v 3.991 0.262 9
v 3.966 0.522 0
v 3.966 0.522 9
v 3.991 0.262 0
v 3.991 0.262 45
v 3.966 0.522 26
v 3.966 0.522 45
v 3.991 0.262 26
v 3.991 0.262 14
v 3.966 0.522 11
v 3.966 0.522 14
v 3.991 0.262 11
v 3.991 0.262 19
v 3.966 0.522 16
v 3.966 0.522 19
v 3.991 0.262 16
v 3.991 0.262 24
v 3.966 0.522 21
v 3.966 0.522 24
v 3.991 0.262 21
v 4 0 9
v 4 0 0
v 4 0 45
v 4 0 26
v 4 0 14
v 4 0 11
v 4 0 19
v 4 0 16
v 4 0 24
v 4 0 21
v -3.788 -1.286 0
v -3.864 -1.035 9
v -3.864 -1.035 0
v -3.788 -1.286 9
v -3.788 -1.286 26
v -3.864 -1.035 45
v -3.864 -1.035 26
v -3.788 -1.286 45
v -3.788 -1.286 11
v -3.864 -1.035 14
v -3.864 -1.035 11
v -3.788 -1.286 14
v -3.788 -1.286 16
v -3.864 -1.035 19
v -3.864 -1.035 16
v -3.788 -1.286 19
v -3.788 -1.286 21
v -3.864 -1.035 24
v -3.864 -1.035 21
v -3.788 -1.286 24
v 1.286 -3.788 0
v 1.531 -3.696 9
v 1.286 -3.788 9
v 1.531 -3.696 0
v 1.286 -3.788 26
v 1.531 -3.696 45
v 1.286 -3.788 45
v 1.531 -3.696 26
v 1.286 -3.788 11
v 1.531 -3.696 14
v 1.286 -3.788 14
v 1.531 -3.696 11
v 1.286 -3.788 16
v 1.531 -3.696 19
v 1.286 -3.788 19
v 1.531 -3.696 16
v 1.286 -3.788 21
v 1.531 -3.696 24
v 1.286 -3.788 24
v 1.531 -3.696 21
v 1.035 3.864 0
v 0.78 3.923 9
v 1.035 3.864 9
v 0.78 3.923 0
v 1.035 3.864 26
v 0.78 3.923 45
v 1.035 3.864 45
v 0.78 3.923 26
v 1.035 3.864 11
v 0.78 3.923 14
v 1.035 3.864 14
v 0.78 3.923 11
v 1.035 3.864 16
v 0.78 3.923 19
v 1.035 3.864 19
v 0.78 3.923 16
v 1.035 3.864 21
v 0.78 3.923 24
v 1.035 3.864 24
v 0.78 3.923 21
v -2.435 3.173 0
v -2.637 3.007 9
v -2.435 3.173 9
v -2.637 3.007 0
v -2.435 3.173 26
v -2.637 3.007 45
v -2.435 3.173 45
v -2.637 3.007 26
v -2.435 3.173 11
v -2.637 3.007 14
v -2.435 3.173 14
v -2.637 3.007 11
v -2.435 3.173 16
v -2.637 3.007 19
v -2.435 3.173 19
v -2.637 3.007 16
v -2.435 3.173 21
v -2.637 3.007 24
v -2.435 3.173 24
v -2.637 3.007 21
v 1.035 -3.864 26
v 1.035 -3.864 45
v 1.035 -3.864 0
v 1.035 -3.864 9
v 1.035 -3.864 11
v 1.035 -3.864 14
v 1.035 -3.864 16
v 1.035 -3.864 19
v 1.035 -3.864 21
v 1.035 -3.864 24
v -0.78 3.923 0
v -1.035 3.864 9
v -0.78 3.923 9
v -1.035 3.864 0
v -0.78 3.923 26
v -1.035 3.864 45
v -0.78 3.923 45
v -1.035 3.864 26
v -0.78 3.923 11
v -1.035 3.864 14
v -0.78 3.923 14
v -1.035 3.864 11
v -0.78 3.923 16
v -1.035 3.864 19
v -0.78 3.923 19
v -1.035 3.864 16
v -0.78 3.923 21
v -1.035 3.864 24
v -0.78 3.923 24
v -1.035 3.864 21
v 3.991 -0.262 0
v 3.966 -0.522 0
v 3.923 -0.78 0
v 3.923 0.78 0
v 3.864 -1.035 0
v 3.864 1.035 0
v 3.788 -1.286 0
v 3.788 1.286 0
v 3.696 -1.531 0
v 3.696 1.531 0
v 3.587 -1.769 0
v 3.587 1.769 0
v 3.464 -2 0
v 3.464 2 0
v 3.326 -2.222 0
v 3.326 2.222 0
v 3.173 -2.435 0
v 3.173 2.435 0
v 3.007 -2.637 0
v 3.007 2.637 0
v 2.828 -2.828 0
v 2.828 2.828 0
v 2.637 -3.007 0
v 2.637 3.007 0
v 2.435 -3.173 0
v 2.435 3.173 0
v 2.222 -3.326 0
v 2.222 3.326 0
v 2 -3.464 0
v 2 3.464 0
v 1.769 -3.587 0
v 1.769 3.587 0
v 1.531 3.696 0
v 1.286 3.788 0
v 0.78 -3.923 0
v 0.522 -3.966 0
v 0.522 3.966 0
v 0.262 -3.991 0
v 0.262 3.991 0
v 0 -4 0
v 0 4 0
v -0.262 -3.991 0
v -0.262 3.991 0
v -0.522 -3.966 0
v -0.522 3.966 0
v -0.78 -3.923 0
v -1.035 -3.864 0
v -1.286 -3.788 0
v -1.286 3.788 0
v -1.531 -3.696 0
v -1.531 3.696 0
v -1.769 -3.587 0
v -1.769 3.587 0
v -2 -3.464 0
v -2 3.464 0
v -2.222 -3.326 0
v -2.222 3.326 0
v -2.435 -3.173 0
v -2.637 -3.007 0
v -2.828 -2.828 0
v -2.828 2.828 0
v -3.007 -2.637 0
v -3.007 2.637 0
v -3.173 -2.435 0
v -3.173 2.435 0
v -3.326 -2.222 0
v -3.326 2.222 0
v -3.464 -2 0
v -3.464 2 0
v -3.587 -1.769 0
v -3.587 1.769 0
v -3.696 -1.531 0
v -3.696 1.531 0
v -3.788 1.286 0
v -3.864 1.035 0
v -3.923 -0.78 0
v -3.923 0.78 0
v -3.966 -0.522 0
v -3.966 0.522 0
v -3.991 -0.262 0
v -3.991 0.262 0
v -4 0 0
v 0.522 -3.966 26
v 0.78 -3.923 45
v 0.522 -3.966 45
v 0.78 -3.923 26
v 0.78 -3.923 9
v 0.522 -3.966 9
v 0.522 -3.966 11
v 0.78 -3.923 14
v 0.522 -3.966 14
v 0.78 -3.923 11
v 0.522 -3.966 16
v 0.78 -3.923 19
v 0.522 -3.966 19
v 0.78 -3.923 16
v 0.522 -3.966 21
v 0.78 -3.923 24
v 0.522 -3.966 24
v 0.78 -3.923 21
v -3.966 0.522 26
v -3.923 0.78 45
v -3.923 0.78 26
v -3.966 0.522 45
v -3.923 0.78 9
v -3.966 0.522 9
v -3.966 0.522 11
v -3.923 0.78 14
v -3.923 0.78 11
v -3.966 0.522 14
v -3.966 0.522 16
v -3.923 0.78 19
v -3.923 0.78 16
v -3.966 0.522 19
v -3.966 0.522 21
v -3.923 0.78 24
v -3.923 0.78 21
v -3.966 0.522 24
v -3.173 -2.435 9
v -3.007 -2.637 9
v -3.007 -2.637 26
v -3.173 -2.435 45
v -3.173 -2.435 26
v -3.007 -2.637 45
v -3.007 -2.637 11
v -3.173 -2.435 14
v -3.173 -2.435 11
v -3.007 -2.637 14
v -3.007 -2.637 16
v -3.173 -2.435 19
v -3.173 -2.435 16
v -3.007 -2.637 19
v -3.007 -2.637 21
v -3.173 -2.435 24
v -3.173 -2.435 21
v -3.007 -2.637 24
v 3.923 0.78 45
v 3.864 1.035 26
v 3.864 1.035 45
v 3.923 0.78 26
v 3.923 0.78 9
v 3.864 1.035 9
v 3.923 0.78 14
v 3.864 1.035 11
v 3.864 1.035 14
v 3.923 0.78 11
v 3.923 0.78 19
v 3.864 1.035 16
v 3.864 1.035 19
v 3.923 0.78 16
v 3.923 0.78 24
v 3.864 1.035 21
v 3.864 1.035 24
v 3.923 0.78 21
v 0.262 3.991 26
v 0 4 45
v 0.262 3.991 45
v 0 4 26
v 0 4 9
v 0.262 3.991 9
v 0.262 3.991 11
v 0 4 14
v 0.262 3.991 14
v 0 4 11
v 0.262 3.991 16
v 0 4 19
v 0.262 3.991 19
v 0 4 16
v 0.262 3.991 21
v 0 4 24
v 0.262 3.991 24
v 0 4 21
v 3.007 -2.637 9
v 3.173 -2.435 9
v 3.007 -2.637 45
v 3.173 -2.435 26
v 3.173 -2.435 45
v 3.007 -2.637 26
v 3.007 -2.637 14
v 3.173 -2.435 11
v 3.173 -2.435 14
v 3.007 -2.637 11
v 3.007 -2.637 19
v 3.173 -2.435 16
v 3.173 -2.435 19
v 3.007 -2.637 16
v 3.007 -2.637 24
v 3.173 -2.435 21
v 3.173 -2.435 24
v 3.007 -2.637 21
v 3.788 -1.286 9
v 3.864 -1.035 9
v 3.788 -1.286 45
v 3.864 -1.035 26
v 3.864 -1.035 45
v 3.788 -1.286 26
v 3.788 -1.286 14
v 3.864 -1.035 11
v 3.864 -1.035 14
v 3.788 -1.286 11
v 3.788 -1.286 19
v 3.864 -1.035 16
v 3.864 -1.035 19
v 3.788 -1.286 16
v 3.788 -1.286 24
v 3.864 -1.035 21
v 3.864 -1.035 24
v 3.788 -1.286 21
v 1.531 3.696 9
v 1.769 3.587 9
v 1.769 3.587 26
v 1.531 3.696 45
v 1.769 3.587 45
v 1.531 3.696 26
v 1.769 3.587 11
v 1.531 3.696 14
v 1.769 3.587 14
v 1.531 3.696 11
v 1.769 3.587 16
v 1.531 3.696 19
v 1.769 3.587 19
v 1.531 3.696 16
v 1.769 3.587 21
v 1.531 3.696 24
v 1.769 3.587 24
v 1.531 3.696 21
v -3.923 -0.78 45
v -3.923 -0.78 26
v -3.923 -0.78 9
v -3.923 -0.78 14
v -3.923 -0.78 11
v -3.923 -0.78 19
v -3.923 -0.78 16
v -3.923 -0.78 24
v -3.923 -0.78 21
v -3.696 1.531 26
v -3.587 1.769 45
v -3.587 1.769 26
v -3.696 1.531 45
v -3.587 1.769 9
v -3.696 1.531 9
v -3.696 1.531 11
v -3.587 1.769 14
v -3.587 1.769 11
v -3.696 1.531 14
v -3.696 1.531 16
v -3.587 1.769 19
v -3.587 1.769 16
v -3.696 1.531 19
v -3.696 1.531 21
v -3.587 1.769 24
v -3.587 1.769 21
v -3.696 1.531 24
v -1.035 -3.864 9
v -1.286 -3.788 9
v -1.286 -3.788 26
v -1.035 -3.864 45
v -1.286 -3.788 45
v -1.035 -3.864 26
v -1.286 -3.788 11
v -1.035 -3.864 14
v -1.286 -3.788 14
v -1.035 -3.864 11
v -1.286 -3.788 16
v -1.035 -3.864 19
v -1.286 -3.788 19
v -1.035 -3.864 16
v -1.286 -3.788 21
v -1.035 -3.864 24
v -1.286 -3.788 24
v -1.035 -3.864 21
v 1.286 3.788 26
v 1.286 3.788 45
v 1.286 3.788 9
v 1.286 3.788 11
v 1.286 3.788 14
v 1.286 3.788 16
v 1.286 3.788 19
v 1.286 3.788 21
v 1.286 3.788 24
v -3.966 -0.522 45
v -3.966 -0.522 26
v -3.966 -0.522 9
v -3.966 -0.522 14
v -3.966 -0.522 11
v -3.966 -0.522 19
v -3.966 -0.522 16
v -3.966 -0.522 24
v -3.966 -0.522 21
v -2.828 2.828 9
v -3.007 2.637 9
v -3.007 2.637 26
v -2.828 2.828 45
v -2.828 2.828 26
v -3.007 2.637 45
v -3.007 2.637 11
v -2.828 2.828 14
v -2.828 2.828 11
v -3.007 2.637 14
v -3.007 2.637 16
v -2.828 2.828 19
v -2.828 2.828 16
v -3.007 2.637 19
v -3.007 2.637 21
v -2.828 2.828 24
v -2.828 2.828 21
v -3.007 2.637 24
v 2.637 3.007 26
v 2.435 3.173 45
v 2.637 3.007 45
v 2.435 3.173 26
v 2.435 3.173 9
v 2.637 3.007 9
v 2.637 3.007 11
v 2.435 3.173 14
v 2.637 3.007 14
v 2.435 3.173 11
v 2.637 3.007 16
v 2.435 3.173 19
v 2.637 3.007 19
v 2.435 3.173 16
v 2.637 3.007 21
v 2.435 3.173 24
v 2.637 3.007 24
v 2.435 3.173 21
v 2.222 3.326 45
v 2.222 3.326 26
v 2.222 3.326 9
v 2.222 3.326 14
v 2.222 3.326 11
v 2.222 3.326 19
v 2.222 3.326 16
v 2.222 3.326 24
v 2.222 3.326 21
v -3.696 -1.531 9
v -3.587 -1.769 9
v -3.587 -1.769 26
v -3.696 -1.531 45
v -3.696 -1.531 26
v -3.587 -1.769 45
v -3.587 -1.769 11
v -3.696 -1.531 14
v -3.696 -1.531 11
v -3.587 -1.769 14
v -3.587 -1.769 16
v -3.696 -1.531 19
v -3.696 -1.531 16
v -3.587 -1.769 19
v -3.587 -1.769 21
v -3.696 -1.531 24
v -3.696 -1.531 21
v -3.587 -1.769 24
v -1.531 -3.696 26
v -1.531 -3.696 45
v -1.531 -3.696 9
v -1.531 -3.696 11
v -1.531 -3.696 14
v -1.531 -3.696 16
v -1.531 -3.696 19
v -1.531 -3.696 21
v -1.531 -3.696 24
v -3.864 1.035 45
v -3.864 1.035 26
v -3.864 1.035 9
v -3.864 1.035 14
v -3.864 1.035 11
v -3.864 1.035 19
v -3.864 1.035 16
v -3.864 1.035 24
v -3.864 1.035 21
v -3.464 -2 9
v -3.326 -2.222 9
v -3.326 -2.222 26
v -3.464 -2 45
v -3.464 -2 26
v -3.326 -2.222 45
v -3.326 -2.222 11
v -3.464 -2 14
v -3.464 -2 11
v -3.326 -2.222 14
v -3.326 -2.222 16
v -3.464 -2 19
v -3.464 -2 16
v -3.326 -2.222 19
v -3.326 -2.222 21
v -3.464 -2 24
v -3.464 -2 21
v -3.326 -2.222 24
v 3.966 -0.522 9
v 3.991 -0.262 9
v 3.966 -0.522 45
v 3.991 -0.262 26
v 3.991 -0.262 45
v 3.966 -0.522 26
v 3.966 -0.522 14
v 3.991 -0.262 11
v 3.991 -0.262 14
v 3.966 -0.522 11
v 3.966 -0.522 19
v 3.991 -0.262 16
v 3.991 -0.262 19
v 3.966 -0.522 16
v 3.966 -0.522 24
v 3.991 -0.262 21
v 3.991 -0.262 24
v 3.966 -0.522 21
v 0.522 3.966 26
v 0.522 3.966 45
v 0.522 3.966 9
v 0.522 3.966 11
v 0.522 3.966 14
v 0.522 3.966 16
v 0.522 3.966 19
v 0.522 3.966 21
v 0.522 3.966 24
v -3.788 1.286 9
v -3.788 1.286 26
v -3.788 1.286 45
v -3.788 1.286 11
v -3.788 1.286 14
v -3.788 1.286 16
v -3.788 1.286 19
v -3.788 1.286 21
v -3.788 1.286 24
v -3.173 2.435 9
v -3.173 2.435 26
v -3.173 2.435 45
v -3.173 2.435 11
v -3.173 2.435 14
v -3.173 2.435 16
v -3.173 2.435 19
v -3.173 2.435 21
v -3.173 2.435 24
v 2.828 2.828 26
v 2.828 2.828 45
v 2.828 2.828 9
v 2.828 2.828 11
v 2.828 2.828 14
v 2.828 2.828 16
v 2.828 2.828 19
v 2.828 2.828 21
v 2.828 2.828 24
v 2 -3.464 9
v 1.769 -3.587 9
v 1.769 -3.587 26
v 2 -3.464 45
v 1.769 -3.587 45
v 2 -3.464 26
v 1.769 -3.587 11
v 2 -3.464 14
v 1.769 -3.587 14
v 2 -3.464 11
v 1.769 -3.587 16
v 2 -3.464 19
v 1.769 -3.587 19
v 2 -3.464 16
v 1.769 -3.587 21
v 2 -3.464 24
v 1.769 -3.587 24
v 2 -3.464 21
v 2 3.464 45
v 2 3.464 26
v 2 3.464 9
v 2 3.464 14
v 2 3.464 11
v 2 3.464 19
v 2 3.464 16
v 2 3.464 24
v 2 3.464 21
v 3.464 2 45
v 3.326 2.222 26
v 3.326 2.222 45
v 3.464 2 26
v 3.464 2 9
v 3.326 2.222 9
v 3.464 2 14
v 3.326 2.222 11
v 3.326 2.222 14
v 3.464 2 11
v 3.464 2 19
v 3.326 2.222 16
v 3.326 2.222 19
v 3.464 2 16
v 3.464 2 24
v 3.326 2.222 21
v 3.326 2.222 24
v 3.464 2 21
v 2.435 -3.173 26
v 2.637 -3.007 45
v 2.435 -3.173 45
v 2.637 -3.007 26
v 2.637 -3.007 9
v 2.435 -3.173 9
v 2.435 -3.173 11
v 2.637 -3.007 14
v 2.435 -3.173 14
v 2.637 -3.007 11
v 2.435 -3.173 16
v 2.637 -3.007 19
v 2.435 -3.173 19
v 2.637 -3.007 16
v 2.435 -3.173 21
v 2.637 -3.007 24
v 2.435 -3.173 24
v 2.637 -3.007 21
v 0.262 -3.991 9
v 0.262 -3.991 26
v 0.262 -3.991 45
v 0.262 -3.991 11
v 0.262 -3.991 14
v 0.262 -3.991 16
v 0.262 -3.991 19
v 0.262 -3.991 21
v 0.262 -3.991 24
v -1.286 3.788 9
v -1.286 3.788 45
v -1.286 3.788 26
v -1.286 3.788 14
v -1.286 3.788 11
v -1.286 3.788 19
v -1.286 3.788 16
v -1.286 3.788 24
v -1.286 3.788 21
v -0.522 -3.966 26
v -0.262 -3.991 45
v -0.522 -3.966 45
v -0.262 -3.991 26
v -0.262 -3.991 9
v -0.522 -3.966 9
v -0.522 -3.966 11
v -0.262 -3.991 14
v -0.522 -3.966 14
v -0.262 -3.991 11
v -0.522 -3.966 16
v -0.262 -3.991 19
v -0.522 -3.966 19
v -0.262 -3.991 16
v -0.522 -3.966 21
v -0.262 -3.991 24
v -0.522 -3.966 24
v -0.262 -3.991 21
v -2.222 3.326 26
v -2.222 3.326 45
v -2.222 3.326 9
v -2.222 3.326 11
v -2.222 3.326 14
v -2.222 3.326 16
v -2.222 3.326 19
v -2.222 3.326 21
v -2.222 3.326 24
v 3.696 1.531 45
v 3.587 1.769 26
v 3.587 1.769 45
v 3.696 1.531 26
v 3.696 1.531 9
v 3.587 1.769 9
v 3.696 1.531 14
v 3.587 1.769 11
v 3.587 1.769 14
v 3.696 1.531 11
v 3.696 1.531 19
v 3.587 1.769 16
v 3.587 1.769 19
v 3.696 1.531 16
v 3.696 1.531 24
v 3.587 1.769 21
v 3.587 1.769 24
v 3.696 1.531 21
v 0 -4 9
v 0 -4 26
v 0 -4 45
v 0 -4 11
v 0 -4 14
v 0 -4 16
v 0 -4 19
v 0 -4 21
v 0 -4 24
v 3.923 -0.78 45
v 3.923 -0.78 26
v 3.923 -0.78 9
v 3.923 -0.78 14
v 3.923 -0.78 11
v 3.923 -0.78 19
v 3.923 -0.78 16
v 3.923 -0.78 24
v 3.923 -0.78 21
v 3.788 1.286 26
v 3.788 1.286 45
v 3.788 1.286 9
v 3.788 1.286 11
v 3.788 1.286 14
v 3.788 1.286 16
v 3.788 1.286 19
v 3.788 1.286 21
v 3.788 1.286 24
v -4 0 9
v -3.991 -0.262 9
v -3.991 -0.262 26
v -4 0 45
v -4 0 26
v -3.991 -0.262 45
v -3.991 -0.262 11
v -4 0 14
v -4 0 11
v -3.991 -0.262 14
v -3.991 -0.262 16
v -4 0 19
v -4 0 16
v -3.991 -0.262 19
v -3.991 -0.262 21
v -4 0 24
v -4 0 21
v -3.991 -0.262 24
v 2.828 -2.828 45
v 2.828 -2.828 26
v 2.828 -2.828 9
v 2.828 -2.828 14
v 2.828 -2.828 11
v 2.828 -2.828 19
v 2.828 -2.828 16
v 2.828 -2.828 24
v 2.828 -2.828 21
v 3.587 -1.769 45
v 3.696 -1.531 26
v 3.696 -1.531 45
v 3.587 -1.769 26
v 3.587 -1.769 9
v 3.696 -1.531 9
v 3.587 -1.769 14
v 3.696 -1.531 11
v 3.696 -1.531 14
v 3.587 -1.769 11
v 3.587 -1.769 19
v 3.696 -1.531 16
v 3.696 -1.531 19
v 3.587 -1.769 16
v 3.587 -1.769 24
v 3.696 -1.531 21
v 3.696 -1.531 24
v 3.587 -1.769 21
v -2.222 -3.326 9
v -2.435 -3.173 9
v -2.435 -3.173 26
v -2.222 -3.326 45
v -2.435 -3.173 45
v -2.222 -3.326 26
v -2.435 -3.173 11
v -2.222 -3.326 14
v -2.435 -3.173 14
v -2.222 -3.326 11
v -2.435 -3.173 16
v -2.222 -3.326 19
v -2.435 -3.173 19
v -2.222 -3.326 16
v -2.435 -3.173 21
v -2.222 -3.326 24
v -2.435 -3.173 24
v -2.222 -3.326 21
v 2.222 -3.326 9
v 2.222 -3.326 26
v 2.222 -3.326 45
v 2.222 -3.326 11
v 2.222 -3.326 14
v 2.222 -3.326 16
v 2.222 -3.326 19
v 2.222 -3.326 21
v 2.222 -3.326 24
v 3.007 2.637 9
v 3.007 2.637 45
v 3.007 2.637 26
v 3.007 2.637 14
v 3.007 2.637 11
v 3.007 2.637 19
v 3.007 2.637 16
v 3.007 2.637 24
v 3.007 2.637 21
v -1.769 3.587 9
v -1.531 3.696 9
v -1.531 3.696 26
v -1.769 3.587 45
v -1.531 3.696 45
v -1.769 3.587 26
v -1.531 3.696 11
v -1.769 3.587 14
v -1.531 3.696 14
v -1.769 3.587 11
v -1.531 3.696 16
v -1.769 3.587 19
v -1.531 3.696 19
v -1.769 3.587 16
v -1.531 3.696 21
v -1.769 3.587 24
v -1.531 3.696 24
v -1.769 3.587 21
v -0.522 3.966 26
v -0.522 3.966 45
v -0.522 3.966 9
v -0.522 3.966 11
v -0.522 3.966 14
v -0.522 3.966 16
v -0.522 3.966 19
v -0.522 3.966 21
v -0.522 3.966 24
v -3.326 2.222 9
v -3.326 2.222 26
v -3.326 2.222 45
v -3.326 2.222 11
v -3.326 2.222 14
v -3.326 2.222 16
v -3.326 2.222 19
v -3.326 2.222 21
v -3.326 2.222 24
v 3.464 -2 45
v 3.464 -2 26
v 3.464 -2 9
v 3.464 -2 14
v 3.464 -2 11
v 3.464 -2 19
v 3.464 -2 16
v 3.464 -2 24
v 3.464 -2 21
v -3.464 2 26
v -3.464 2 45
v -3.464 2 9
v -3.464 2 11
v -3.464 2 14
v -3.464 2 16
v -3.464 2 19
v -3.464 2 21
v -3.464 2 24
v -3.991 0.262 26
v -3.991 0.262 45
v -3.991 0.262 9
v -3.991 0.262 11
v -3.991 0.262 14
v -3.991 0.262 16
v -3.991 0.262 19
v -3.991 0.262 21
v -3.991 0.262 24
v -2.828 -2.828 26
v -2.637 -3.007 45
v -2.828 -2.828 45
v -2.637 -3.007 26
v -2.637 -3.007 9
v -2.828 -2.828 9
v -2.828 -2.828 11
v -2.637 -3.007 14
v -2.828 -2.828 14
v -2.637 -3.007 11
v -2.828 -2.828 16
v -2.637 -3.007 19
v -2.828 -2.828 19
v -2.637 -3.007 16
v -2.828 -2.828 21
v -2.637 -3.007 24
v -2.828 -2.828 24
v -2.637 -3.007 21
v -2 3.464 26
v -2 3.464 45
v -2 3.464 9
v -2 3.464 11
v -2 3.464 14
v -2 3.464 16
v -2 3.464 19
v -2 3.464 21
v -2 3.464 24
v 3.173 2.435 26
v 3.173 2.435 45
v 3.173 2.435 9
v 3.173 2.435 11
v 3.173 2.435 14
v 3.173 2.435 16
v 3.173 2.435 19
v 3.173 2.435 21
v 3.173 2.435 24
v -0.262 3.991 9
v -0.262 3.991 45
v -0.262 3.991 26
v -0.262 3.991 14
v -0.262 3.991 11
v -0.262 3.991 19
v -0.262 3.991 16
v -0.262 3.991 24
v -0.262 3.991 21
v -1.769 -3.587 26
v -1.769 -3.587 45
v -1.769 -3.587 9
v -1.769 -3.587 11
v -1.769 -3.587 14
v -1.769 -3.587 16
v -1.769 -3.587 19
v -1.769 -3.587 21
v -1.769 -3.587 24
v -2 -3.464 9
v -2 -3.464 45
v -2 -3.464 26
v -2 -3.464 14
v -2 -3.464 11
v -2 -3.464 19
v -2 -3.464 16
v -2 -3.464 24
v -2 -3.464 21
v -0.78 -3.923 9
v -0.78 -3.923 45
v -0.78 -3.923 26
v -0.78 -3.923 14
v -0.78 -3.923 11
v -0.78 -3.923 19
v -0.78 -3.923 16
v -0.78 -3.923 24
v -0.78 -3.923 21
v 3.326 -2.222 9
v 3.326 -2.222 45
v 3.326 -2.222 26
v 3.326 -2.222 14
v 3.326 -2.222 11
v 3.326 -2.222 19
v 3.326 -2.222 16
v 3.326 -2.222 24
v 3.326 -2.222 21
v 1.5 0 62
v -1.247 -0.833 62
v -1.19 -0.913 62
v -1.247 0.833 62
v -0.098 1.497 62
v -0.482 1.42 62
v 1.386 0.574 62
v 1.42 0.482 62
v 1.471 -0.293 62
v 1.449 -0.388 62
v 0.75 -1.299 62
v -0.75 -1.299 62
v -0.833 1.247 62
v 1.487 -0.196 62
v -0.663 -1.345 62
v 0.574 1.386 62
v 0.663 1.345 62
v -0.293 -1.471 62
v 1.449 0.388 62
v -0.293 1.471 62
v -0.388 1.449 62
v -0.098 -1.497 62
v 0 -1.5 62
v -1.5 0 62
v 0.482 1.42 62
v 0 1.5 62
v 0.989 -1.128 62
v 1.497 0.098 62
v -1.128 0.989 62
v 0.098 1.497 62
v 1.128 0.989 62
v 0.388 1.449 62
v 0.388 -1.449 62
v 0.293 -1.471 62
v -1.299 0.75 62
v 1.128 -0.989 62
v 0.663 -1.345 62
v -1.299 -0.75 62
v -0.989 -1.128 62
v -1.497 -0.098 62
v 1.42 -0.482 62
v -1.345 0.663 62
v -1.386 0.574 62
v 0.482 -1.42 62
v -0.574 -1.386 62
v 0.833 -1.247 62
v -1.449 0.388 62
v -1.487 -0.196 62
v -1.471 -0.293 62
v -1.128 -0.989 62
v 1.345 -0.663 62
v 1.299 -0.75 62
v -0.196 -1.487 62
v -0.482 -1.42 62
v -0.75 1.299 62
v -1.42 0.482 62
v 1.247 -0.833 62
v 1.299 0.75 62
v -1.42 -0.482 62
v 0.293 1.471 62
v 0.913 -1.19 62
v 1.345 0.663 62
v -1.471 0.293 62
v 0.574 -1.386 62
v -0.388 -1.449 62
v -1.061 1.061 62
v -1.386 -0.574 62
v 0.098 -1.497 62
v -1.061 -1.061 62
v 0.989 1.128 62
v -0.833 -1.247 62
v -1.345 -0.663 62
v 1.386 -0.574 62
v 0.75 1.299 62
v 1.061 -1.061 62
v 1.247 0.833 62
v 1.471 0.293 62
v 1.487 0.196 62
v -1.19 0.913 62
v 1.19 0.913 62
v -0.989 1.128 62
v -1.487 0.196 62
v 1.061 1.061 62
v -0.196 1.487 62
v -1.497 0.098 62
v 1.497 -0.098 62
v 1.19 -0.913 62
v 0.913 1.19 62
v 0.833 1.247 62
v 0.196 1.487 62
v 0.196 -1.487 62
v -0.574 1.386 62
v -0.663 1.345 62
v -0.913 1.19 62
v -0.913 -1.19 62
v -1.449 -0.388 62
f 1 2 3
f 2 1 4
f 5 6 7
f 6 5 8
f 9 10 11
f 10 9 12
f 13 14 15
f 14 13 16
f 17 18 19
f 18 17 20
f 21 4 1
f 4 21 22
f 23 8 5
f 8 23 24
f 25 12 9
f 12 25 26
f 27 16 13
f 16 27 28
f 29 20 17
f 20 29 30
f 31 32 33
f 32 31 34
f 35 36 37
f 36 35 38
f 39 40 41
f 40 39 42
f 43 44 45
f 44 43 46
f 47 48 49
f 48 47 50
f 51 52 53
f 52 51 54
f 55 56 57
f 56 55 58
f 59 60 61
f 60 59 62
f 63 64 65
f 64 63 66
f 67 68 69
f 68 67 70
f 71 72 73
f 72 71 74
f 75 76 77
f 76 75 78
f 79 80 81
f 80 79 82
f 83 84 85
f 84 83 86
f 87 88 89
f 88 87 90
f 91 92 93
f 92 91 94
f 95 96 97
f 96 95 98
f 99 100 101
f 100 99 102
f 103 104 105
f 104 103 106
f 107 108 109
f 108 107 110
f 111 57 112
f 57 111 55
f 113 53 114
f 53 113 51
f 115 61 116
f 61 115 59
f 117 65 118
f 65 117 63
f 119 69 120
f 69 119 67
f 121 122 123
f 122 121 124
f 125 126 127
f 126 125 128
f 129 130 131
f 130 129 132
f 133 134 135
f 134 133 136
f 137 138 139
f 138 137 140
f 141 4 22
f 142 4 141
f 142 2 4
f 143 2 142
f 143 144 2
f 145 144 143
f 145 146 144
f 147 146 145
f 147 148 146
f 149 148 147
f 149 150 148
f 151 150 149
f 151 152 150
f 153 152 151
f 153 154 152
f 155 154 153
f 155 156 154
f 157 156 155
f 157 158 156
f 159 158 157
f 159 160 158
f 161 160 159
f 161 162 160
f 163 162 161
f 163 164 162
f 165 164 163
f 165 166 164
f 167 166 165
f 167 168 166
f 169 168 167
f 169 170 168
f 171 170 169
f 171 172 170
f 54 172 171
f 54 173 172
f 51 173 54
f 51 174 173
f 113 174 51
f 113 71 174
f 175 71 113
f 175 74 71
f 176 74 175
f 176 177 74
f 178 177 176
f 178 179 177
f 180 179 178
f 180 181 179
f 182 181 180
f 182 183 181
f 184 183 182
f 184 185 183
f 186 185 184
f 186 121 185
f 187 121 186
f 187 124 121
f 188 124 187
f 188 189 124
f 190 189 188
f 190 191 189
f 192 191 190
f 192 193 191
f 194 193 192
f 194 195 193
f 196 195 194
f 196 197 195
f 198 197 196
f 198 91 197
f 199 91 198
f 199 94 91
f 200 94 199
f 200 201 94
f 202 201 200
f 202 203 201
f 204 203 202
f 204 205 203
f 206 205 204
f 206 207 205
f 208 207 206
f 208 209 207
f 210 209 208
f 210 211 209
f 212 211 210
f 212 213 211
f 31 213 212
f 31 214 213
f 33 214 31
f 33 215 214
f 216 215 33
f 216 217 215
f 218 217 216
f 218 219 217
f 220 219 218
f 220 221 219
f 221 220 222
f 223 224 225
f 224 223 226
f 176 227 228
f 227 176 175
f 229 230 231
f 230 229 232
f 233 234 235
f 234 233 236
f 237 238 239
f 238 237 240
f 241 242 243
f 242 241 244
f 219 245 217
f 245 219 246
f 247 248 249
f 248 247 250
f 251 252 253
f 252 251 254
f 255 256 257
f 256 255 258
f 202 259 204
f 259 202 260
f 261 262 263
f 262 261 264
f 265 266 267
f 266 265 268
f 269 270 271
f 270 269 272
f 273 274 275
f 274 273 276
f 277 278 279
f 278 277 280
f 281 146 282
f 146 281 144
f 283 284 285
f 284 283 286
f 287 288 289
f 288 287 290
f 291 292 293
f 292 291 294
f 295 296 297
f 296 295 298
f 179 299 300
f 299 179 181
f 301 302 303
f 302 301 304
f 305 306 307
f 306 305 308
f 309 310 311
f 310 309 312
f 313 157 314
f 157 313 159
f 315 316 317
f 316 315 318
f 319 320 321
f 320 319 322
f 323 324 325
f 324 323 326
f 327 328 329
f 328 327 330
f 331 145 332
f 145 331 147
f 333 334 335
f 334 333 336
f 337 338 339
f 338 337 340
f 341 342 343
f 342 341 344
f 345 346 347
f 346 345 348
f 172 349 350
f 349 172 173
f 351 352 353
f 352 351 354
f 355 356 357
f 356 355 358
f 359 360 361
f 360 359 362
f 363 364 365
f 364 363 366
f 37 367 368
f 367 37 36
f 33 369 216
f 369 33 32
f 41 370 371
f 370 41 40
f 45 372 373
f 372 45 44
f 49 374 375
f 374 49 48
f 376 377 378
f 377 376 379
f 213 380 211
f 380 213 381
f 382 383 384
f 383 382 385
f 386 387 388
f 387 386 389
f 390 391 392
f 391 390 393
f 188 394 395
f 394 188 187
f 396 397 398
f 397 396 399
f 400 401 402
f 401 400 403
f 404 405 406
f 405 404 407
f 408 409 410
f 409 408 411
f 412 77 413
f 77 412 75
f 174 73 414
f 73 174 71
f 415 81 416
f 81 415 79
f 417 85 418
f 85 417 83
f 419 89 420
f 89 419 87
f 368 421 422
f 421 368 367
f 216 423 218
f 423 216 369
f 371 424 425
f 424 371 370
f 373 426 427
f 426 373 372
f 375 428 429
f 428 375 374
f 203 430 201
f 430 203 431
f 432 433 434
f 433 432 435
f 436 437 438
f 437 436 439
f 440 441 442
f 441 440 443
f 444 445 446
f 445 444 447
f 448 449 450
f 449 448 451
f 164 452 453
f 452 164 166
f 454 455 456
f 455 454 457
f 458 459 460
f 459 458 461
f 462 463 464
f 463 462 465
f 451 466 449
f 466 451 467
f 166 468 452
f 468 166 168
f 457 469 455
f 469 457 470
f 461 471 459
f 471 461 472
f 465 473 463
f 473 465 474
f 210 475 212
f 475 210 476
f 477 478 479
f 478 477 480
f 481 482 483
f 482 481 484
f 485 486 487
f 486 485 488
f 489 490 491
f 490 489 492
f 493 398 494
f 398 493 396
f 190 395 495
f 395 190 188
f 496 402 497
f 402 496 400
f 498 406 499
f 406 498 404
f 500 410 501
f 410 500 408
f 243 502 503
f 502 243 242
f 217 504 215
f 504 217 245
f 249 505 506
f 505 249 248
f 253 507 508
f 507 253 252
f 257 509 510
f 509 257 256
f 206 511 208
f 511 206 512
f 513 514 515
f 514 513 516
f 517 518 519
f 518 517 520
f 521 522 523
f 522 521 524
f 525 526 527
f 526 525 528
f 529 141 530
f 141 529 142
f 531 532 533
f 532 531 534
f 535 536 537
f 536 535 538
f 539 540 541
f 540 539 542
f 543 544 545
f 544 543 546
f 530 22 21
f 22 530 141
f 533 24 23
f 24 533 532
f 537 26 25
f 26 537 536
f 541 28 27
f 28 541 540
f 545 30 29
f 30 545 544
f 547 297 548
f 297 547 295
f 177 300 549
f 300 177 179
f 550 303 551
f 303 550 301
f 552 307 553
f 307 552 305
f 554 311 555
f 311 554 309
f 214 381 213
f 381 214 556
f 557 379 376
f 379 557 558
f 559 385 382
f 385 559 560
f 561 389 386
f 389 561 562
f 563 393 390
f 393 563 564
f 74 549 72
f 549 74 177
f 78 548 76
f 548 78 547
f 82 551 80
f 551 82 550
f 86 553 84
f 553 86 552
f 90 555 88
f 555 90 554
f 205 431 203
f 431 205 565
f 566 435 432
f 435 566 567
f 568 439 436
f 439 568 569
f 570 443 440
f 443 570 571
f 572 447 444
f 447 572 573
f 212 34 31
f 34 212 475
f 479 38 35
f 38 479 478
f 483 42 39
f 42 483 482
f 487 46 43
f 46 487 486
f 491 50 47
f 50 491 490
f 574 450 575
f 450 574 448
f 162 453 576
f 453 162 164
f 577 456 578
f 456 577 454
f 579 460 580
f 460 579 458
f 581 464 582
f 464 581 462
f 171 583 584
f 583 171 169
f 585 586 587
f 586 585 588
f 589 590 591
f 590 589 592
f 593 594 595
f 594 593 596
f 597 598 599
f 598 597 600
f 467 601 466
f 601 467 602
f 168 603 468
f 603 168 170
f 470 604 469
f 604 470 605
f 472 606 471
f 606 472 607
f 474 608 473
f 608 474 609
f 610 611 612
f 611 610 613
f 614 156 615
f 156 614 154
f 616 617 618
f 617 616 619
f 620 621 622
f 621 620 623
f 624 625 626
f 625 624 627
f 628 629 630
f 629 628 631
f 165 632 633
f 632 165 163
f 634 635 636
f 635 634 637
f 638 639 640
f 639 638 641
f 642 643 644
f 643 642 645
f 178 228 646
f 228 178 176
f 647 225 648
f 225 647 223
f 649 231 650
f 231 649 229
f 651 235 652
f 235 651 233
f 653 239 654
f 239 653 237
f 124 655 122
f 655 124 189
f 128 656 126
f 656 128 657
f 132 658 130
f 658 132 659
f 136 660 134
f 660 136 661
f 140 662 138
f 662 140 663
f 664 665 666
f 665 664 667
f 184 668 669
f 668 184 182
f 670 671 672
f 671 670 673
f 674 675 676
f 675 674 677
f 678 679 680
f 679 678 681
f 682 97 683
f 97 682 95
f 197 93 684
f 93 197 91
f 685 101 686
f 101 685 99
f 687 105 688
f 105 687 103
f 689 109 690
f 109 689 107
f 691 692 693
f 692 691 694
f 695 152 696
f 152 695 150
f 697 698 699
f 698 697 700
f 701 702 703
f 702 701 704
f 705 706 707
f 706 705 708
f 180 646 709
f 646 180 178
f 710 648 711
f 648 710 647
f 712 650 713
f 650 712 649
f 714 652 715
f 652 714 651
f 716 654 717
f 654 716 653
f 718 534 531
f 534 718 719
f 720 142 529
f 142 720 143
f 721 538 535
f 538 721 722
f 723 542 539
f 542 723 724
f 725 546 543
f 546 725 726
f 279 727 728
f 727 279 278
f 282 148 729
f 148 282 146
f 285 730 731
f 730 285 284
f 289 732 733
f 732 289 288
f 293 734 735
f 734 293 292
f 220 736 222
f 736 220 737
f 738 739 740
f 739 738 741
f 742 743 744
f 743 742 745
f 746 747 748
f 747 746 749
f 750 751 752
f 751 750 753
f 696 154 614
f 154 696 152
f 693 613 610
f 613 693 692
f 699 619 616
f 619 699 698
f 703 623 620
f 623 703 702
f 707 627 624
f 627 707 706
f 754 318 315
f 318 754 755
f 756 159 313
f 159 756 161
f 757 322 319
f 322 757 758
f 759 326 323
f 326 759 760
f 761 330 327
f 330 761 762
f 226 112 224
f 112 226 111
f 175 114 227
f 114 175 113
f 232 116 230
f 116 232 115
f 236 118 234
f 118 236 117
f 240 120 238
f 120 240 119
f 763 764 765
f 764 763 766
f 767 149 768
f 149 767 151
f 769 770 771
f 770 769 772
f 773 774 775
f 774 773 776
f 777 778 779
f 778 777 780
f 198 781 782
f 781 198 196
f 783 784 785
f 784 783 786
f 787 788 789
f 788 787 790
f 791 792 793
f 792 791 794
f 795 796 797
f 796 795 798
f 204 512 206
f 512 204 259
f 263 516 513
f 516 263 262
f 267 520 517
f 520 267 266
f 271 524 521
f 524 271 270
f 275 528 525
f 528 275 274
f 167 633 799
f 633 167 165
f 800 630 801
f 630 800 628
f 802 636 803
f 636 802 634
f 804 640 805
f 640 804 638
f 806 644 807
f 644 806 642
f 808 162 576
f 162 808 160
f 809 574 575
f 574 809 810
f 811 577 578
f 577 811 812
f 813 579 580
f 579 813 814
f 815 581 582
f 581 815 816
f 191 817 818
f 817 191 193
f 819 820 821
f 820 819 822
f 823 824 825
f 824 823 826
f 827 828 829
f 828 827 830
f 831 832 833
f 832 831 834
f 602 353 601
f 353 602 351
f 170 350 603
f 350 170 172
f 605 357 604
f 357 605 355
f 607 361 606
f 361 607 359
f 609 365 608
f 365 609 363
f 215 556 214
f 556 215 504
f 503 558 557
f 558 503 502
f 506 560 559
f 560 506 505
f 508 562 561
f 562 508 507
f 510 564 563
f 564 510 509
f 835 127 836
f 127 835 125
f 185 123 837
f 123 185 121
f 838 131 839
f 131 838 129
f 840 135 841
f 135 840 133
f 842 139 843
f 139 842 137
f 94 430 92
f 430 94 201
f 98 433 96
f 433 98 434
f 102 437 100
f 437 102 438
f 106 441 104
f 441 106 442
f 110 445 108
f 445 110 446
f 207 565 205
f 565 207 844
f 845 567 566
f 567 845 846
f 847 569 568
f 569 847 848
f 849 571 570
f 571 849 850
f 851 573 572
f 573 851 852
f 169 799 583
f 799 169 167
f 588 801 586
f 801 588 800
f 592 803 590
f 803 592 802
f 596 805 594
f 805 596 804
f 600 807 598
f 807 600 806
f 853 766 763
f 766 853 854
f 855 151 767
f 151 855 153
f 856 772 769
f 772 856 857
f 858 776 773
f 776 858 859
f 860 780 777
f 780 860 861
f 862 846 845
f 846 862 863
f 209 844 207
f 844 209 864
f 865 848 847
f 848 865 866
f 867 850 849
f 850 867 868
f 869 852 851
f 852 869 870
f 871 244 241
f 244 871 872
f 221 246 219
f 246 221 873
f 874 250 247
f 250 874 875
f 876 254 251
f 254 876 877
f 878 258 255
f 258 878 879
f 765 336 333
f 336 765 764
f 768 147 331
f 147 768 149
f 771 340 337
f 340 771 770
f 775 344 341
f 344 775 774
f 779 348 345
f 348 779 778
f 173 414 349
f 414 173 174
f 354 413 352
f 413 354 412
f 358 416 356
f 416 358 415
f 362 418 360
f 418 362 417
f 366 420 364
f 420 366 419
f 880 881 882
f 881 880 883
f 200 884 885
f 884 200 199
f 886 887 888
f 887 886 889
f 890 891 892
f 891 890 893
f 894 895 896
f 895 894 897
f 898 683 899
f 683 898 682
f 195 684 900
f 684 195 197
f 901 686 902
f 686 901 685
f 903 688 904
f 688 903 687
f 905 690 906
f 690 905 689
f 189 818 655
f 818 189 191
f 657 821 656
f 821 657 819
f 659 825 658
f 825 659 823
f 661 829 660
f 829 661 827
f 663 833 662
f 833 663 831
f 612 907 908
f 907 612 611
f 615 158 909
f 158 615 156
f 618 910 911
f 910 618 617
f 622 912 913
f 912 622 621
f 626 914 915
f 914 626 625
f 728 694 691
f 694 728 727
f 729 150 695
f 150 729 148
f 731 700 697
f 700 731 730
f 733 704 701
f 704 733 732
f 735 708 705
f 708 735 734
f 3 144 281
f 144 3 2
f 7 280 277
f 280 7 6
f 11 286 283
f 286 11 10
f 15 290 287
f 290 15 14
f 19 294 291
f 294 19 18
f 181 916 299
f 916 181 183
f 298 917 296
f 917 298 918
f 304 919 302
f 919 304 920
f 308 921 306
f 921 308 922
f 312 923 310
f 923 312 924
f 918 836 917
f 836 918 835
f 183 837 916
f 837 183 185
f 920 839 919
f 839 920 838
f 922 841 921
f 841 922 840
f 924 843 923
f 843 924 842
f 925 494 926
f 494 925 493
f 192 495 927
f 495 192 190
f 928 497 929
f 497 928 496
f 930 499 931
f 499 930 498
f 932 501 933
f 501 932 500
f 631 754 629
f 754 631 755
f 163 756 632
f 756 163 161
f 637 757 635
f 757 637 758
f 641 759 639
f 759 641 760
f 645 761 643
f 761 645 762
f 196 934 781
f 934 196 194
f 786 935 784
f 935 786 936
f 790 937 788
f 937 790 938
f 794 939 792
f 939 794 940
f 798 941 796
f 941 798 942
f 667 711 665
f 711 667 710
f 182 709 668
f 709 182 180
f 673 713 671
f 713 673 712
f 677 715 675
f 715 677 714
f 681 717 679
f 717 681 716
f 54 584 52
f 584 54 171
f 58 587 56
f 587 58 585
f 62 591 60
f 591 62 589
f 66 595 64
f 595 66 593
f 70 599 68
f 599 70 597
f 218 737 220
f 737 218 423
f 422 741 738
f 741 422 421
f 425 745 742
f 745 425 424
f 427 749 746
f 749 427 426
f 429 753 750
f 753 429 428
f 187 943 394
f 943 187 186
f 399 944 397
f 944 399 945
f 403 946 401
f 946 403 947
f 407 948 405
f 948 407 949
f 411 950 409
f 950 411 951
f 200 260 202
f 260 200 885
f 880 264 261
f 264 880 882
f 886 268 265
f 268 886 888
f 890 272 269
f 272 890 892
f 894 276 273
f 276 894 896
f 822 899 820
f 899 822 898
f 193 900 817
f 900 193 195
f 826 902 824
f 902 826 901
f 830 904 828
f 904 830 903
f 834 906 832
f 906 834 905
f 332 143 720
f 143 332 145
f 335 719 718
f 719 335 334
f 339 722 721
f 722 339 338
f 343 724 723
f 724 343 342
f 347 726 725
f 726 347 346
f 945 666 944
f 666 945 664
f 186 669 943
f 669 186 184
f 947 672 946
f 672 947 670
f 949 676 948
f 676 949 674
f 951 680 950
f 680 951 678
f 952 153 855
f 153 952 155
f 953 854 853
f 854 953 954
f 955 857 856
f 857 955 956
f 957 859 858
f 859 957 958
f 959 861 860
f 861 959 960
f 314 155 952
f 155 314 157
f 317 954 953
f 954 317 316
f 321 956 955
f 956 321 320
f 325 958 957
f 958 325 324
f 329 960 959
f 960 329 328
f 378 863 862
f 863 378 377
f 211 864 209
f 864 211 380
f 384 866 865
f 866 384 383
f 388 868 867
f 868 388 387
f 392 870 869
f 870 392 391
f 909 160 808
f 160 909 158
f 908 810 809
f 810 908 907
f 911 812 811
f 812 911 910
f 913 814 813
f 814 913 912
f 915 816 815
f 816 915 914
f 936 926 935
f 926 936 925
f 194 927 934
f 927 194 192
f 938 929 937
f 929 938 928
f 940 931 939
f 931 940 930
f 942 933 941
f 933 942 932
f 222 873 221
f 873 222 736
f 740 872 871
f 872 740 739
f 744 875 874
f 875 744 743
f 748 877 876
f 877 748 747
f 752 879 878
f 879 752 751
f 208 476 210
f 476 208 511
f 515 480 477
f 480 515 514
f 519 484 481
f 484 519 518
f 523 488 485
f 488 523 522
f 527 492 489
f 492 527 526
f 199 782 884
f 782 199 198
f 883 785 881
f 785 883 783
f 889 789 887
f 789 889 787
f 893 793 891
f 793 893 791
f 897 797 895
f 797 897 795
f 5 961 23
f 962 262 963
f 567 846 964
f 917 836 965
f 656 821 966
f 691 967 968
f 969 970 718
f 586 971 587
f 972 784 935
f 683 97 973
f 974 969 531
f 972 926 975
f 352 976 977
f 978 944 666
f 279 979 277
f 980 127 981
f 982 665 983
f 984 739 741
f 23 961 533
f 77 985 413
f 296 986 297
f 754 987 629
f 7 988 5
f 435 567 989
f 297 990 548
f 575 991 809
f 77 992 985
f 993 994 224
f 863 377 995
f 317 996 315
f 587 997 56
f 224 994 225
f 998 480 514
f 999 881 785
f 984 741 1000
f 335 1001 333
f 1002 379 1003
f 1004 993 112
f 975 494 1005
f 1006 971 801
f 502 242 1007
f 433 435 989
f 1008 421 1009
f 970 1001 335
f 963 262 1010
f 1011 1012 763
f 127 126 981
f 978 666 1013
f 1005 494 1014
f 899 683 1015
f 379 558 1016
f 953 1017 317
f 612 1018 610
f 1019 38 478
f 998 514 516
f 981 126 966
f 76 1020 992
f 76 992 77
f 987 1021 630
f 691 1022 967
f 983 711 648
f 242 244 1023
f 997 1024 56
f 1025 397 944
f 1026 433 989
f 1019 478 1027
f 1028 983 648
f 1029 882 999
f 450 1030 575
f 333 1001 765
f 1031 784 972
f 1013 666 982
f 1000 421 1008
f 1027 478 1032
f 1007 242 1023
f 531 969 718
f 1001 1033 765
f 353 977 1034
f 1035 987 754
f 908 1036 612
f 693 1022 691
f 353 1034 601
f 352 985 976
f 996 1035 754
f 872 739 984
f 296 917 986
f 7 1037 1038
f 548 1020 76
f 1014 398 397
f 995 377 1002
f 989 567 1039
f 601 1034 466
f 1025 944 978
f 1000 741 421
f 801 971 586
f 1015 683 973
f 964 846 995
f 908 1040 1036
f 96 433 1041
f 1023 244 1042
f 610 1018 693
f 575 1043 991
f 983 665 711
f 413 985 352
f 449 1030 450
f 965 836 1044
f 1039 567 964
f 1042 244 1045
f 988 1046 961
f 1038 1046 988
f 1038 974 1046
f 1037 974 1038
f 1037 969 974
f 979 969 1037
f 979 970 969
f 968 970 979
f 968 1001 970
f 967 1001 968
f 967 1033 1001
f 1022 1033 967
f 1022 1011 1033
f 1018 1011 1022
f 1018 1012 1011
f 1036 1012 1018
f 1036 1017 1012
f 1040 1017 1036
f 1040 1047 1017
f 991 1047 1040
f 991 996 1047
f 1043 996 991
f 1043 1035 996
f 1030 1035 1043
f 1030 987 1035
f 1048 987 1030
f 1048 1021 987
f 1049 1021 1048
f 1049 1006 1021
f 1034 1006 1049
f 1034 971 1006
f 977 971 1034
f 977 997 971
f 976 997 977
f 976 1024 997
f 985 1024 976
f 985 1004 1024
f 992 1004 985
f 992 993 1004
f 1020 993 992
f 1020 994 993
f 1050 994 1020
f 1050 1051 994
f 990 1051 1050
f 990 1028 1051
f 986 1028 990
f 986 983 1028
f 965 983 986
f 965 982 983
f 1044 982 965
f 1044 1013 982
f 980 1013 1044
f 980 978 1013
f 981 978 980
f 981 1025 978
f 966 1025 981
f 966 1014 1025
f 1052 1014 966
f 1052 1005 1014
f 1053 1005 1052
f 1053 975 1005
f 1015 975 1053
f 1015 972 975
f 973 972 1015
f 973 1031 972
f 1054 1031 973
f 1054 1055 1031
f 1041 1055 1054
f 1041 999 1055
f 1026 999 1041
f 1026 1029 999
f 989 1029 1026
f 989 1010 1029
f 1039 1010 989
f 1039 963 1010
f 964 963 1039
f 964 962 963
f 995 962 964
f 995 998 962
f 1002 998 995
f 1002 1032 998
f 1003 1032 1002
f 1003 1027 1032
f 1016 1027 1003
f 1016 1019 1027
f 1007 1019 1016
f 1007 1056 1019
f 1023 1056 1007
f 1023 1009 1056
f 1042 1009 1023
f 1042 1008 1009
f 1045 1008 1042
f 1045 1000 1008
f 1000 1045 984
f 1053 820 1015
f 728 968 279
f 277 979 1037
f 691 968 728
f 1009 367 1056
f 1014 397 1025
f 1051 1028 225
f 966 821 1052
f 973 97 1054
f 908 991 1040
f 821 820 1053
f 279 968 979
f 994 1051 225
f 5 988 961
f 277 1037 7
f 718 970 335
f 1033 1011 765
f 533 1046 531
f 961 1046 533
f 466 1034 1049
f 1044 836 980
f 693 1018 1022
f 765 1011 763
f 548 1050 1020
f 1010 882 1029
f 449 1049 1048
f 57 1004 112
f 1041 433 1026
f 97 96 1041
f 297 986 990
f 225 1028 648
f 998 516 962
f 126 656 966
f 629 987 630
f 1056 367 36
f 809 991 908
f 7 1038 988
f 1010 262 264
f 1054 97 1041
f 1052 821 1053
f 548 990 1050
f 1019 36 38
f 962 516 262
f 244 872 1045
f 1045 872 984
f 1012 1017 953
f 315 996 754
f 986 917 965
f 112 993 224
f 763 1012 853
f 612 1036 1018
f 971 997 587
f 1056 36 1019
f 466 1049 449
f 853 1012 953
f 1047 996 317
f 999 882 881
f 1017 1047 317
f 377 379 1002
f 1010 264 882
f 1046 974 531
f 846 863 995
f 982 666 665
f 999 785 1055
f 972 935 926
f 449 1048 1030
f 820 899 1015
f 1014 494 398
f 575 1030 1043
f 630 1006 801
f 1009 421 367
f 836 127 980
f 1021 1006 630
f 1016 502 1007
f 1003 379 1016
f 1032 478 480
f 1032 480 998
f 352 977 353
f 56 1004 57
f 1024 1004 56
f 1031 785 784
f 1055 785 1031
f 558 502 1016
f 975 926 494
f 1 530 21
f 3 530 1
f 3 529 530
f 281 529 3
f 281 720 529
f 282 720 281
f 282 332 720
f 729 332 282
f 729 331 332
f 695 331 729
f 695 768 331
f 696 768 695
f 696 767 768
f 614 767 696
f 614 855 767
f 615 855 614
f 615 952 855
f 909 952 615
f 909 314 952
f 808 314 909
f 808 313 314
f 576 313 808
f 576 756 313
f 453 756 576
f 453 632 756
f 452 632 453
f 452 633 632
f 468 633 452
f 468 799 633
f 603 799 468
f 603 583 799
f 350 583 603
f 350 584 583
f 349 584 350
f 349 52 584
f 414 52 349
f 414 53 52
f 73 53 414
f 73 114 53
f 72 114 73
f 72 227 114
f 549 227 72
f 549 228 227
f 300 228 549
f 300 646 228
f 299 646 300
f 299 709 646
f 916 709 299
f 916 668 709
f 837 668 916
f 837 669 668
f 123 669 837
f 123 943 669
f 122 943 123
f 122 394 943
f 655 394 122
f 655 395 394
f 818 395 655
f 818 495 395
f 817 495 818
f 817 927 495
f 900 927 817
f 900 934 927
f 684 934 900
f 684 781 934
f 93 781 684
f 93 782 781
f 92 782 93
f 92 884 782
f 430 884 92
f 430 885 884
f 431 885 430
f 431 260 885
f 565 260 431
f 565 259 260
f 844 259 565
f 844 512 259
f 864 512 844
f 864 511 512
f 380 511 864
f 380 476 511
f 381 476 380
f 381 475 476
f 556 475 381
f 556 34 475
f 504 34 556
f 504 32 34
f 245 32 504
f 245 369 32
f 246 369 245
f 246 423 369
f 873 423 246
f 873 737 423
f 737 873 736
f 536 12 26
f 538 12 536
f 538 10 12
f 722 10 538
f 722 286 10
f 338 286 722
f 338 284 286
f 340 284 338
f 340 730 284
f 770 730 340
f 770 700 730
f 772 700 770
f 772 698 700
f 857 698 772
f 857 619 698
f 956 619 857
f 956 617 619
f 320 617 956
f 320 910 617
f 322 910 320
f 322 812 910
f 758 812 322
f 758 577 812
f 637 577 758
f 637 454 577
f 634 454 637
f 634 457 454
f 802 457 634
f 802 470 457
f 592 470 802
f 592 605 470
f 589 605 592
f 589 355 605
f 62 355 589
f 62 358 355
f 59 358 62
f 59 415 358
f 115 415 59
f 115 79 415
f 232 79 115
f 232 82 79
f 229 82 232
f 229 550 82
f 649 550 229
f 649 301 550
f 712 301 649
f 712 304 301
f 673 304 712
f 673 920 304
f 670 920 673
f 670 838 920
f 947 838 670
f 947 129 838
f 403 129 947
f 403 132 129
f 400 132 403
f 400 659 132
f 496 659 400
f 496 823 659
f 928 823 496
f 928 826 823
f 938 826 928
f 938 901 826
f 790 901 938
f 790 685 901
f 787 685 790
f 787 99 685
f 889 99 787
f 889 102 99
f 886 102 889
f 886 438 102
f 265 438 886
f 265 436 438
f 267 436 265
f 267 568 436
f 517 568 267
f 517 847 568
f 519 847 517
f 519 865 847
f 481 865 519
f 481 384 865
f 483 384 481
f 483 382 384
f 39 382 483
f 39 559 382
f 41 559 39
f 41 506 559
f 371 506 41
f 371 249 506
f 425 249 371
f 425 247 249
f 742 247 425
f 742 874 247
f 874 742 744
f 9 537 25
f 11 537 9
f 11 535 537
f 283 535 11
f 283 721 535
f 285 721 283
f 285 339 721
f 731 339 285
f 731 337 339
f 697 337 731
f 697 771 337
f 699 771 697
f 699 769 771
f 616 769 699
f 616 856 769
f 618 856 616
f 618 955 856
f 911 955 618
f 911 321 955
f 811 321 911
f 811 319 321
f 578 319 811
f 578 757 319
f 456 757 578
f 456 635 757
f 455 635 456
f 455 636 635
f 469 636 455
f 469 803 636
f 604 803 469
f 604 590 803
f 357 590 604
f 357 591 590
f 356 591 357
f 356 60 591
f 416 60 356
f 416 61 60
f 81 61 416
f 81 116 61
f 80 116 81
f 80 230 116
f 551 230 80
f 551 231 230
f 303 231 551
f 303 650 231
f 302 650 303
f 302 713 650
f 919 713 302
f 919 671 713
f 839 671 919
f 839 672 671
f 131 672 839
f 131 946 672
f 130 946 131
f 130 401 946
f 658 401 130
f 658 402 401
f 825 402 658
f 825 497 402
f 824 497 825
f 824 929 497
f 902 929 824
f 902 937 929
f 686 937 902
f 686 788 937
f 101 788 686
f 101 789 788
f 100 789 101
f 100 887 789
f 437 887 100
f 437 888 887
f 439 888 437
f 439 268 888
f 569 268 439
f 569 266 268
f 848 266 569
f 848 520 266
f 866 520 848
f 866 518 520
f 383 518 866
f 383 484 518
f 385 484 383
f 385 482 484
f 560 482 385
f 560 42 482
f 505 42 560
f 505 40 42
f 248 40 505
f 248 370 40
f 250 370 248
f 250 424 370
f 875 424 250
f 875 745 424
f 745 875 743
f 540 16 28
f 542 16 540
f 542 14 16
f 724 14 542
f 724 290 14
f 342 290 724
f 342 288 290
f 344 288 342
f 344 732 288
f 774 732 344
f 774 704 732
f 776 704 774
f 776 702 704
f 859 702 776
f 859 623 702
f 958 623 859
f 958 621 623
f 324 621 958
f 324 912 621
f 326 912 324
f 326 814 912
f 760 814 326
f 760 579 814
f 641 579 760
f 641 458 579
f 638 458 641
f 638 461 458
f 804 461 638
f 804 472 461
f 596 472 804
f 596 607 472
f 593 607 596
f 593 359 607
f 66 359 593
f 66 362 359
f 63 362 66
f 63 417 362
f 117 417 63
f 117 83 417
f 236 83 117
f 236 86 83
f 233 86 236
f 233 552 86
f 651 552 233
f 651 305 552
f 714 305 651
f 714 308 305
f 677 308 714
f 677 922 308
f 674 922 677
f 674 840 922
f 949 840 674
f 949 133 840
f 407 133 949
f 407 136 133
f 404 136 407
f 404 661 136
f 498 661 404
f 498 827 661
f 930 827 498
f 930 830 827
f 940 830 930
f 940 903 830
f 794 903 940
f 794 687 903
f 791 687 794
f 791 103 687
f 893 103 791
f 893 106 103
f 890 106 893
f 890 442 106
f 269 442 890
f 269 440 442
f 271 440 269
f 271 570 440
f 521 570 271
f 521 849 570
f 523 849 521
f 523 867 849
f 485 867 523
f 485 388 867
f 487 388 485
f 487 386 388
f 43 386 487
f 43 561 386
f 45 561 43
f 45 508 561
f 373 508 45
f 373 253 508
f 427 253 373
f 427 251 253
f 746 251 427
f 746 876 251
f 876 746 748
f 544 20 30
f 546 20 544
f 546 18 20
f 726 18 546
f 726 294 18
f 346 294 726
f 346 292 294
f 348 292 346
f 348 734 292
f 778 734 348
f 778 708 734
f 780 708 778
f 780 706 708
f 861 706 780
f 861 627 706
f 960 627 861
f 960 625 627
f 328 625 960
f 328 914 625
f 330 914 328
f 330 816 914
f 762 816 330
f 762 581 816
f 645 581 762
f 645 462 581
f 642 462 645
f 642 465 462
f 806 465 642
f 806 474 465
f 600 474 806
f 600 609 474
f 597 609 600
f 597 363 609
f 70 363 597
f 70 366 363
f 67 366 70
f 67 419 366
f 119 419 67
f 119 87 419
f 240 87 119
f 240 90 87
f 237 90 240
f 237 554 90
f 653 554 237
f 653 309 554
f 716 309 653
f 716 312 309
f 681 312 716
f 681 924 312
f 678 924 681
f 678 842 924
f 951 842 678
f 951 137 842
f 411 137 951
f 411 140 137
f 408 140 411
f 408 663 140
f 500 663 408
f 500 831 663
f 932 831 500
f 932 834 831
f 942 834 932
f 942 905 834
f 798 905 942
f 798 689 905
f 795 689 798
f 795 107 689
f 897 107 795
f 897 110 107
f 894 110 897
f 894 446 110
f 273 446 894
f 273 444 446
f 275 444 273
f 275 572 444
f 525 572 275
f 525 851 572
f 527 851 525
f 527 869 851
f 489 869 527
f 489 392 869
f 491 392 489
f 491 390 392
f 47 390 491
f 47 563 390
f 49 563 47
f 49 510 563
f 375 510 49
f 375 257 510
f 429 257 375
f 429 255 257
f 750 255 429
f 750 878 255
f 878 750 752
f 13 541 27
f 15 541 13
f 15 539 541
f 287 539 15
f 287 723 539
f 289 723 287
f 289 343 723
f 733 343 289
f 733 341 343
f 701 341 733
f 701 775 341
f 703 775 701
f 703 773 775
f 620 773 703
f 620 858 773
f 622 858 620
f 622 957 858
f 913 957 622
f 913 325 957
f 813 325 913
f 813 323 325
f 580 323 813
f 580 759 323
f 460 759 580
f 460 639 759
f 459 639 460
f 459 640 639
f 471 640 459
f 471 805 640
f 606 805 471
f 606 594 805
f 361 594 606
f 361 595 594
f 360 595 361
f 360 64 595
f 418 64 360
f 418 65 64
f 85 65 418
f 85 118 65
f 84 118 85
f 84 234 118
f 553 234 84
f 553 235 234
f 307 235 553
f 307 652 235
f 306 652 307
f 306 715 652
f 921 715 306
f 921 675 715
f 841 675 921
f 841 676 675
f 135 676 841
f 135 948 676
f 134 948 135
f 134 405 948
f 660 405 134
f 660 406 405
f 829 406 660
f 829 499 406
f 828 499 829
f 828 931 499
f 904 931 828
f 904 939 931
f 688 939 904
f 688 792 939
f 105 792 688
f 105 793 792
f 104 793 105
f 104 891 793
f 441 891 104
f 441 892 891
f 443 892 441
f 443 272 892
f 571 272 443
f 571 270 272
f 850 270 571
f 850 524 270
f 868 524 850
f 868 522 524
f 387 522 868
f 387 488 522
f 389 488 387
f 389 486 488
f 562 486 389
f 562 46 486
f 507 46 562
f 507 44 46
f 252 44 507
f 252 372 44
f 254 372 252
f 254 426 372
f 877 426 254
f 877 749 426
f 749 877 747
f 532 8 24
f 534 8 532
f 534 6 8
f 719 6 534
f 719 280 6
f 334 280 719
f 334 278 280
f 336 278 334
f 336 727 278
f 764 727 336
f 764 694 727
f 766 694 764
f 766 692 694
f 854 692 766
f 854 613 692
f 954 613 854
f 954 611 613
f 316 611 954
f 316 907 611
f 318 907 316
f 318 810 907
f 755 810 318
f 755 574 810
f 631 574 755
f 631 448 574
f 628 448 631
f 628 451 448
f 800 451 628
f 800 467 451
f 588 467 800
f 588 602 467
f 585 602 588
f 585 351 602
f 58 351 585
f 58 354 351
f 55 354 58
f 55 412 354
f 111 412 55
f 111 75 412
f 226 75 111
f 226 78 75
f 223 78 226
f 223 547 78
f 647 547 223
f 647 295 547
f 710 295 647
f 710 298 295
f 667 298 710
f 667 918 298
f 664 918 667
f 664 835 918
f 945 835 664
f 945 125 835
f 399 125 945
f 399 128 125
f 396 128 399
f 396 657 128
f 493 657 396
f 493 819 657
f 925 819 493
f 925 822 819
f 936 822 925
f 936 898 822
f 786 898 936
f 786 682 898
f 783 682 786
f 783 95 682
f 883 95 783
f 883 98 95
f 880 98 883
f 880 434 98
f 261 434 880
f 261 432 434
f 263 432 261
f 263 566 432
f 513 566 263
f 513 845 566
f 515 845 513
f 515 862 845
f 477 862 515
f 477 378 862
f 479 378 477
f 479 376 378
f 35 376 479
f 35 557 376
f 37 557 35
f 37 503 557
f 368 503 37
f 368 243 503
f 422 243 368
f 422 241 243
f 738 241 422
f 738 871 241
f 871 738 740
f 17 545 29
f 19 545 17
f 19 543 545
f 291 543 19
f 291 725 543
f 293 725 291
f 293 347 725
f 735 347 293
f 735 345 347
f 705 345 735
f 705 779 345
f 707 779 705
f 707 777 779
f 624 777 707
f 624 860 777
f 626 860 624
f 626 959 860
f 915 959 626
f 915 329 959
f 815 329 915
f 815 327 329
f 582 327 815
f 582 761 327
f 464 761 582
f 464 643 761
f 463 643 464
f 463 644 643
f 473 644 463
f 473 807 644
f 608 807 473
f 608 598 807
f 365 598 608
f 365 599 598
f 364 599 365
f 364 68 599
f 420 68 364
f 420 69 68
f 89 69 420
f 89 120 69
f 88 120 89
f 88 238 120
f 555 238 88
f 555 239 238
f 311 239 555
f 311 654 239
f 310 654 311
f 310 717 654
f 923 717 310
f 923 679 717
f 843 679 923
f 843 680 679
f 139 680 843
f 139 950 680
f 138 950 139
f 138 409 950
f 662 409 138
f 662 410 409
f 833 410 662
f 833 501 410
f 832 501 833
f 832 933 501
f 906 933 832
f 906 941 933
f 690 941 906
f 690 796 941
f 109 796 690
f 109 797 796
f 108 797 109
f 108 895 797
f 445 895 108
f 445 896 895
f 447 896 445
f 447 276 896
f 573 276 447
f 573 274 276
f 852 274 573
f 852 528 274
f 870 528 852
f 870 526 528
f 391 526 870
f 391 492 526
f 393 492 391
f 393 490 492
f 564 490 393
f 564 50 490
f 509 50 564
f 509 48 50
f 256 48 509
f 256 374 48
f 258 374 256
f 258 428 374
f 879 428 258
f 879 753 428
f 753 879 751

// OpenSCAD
// Pestle for grinding tissue inside a 1.5 mL microcentrifuge tube
// Print orientation: standing upright on the XY plane, building up +Z

// ---------------- Parameters ----------------
handle_d      = 8;    // handle diameter (mm), z = 0 to 45
handle_h      = 45;   // handle height (mm)
cone_top_d    = 8;    // cone top diameter at z = handle_h (mm)
cone_bottom_d = 3;    // cone tip diameter at z = 62 (mm)
cone_h        = 17;   // cone height (mm), z = 45 to 62
tip_d         = 3;    // tip sphere diameter (mm), centred at z = 62
groove_count  = 4;    // number of circumferential grooves
groove_w      = 2;    // groove width (mm), measured in Z
groove_depth  = 1;    // groove depth (mm)
groove_z      = [10, 15, 20, 25]; // groove centre heights (mm)
eps           = 0.5;  // cutter overshoot past faces (mm)

$fn = 96;             // curve resolution

// ---------------- Model ----------------
difference() {
    union() {
        // (1) Cylindrical handle
        cylinder(d = handle_d, h = handle_h);

        // (2) Tapering cone: 8 mm at z = 45 to 3 mm at z = 62
        translate([0, 0, handle_h])
            cylinder(d1 = cone_top_d, d2 = cone_bottom_d, h = cone_h);

        // (3) Rounded tip: 3 mm sphere centred at z = 62
        translate([0, 0, cone_h])
            sphere(d = tip_d);
    }

    // Grip grooves, cut through the handle (and slightly into the cone)
    for (z = groove_z)
        translate([0, 0, z - groove_w / 2])
            cylinder(d = handle_d + 2 * eps, h = groove_w, $fn = 96);
}
